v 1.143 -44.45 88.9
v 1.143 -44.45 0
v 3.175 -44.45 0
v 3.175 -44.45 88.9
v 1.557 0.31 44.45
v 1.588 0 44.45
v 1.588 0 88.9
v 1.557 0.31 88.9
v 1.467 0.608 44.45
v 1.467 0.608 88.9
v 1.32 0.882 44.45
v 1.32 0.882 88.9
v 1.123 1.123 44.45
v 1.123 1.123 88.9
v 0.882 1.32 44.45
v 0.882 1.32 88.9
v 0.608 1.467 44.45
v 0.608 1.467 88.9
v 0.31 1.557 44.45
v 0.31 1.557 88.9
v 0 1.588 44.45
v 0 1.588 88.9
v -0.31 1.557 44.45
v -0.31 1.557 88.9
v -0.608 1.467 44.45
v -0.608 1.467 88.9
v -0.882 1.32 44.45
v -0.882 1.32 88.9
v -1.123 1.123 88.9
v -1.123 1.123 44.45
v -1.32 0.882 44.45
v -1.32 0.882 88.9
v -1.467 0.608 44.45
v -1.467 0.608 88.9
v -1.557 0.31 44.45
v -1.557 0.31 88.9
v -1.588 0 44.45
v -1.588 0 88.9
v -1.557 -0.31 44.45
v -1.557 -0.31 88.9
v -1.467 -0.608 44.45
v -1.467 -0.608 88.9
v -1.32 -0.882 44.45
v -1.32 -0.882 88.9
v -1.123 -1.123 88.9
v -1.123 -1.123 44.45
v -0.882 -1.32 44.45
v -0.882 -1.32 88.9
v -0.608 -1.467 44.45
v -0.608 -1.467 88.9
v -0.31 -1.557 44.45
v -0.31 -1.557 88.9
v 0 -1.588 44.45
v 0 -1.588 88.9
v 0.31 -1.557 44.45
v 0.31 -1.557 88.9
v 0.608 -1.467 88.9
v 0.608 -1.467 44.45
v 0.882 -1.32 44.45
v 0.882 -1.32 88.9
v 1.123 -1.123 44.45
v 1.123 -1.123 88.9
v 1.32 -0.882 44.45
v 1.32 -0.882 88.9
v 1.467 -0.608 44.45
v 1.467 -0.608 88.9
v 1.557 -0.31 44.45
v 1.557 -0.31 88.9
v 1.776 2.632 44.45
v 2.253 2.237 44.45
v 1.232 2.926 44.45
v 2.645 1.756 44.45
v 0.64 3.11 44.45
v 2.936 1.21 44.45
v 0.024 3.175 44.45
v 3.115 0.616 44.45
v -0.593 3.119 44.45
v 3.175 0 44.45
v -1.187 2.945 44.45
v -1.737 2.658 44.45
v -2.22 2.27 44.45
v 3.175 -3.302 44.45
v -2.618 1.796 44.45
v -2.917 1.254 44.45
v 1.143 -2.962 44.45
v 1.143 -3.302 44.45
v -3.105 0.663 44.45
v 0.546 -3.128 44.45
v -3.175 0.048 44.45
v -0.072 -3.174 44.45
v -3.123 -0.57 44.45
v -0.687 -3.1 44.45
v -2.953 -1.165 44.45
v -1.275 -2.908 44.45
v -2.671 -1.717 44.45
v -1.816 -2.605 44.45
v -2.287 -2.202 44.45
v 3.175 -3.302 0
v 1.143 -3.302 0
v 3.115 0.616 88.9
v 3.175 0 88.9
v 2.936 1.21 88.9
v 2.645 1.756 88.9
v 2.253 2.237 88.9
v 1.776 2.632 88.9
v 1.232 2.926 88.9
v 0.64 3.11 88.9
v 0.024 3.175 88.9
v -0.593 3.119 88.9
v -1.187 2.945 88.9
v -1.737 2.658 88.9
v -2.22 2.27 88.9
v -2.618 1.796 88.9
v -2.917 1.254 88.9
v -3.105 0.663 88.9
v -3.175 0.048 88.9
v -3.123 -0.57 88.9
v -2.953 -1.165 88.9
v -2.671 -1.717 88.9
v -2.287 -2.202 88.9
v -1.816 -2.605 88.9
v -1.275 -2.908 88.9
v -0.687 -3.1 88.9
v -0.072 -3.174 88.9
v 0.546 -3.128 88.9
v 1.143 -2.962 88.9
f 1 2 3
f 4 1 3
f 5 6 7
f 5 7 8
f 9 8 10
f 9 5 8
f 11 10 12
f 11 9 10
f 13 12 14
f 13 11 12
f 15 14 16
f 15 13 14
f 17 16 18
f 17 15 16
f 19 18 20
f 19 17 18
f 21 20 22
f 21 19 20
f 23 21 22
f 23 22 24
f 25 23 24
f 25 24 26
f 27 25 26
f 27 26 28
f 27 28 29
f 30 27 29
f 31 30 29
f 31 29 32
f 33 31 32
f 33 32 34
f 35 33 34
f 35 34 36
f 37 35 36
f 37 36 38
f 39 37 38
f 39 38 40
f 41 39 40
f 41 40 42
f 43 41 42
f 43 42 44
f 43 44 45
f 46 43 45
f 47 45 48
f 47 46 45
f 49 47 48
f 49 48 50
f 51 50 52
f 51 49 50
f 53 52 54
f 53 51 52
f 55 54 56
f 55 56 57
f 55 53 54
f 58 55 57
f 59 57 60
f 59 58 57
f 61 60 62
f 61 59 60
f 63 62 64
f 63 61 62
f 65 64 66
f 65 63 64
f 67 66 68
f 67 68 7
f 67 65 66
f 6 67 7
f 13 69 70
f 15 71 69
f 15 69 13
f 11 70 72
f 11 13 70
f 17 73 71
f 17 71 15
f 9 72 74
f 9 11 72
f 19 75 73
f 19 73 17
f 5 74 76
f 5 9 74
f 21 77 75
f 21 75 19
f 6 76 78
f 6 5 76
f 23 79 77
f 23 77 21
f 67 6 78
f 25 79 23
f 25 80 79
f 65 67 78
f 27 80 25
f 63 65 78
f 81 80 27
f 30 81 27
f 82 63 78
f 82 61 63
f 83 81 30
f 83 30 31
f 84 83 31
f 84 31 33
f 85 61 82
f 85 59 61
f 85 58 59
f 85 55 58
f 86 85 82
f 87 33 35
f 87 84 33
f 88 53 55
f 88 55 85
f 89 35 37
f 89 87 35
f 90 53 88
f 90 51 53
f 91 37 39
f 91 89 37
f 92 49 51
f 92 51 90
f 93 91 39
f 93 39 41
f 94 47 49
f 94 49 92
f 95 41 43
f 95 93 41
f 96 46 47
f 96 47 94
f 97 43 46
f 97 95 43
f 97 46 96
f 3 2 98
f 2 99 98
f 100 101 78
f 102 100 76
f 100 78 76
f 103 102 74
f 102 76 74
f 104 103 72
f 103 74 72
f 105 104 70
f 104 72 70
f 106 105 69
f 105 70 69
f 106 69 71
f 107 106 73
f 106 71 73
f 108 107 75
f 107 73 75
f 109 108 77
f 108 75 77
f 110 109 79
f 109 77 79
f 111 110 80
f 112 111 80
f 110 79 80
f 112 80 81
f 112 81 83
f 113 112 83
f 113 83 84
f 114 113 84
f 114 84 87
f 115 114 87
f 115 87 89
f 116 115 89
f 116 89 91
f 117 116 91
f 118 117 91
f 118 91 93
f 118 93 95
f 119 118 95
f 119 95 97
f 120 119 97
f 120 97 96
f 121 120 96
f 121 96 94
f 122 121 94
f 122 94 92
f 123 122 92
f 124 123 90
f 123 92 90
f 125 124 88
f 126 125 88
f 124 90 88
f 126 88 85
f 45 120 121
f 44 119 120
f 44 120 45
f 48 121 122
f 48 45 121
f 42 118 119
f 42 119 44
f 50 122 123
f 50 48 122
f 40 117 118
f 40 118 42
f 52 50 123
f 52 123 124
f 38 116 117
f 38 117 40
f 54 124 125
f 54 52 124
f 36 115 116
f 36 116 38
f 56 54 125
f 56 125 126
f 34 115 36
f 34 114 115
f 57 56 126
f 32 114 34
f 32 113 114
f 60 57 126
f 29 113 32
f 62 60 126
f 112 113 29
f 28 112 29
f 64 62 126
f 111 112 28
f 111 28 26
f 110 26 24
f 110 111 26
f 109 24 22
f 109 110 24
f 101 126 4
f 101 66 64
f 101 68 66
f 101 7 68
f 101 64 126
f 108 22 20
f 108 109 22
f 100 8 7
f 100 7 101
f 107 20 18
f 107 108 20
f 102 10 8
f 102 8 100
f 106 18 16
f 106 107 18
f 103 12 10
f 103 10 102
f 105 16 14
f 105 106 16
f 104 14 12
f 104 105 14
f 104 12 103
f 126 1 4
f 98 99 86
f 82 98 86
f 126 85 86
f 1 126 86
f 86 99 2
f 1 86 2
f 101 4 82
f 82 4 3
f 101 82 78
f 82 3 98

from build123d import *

# Parameters (mm, degrees)
F0_R     = 1.5875
F1_DEPTH = 88.9
F2_W     = 15.672178
F2_H     = 44.45
F3_DEPTH = 12.7


with BuildPart() as f1:
    # F0 (on Top) → F1 (new body)
    with BuildSketch(Plane.XY):
        with BuildLine():
            Line((3.175, -44.45), (3.175, 0))
            ThreePointArc((3.175, 0), (-2.618172, 1.796051), (1.143, -2.962124))
            Line((1.143, -2.962124), (1.143, -44.45))
            Line((1.143, -44.45), (3.175, -44.45))
        make_face()
        Circle(F0_R, mode=Mode.SUBTRACT)
    extrude(amount=F1_DEPTH)

    # F2 (on face) → F3 (cut, symmetric)
    with BuildSketch(Plane(origin=(1.143, 0, 0), x_dir=(0, -1, 0), z_dir=(-1, 0, 0))):
        with Locations((-4.534089, 22.225)):
            Rectangle(F2_W, F2_H)
    extrude(amount=F3_DEPTH, both=True, mode=Mode.SUBTRACT)


solid = f1.part
